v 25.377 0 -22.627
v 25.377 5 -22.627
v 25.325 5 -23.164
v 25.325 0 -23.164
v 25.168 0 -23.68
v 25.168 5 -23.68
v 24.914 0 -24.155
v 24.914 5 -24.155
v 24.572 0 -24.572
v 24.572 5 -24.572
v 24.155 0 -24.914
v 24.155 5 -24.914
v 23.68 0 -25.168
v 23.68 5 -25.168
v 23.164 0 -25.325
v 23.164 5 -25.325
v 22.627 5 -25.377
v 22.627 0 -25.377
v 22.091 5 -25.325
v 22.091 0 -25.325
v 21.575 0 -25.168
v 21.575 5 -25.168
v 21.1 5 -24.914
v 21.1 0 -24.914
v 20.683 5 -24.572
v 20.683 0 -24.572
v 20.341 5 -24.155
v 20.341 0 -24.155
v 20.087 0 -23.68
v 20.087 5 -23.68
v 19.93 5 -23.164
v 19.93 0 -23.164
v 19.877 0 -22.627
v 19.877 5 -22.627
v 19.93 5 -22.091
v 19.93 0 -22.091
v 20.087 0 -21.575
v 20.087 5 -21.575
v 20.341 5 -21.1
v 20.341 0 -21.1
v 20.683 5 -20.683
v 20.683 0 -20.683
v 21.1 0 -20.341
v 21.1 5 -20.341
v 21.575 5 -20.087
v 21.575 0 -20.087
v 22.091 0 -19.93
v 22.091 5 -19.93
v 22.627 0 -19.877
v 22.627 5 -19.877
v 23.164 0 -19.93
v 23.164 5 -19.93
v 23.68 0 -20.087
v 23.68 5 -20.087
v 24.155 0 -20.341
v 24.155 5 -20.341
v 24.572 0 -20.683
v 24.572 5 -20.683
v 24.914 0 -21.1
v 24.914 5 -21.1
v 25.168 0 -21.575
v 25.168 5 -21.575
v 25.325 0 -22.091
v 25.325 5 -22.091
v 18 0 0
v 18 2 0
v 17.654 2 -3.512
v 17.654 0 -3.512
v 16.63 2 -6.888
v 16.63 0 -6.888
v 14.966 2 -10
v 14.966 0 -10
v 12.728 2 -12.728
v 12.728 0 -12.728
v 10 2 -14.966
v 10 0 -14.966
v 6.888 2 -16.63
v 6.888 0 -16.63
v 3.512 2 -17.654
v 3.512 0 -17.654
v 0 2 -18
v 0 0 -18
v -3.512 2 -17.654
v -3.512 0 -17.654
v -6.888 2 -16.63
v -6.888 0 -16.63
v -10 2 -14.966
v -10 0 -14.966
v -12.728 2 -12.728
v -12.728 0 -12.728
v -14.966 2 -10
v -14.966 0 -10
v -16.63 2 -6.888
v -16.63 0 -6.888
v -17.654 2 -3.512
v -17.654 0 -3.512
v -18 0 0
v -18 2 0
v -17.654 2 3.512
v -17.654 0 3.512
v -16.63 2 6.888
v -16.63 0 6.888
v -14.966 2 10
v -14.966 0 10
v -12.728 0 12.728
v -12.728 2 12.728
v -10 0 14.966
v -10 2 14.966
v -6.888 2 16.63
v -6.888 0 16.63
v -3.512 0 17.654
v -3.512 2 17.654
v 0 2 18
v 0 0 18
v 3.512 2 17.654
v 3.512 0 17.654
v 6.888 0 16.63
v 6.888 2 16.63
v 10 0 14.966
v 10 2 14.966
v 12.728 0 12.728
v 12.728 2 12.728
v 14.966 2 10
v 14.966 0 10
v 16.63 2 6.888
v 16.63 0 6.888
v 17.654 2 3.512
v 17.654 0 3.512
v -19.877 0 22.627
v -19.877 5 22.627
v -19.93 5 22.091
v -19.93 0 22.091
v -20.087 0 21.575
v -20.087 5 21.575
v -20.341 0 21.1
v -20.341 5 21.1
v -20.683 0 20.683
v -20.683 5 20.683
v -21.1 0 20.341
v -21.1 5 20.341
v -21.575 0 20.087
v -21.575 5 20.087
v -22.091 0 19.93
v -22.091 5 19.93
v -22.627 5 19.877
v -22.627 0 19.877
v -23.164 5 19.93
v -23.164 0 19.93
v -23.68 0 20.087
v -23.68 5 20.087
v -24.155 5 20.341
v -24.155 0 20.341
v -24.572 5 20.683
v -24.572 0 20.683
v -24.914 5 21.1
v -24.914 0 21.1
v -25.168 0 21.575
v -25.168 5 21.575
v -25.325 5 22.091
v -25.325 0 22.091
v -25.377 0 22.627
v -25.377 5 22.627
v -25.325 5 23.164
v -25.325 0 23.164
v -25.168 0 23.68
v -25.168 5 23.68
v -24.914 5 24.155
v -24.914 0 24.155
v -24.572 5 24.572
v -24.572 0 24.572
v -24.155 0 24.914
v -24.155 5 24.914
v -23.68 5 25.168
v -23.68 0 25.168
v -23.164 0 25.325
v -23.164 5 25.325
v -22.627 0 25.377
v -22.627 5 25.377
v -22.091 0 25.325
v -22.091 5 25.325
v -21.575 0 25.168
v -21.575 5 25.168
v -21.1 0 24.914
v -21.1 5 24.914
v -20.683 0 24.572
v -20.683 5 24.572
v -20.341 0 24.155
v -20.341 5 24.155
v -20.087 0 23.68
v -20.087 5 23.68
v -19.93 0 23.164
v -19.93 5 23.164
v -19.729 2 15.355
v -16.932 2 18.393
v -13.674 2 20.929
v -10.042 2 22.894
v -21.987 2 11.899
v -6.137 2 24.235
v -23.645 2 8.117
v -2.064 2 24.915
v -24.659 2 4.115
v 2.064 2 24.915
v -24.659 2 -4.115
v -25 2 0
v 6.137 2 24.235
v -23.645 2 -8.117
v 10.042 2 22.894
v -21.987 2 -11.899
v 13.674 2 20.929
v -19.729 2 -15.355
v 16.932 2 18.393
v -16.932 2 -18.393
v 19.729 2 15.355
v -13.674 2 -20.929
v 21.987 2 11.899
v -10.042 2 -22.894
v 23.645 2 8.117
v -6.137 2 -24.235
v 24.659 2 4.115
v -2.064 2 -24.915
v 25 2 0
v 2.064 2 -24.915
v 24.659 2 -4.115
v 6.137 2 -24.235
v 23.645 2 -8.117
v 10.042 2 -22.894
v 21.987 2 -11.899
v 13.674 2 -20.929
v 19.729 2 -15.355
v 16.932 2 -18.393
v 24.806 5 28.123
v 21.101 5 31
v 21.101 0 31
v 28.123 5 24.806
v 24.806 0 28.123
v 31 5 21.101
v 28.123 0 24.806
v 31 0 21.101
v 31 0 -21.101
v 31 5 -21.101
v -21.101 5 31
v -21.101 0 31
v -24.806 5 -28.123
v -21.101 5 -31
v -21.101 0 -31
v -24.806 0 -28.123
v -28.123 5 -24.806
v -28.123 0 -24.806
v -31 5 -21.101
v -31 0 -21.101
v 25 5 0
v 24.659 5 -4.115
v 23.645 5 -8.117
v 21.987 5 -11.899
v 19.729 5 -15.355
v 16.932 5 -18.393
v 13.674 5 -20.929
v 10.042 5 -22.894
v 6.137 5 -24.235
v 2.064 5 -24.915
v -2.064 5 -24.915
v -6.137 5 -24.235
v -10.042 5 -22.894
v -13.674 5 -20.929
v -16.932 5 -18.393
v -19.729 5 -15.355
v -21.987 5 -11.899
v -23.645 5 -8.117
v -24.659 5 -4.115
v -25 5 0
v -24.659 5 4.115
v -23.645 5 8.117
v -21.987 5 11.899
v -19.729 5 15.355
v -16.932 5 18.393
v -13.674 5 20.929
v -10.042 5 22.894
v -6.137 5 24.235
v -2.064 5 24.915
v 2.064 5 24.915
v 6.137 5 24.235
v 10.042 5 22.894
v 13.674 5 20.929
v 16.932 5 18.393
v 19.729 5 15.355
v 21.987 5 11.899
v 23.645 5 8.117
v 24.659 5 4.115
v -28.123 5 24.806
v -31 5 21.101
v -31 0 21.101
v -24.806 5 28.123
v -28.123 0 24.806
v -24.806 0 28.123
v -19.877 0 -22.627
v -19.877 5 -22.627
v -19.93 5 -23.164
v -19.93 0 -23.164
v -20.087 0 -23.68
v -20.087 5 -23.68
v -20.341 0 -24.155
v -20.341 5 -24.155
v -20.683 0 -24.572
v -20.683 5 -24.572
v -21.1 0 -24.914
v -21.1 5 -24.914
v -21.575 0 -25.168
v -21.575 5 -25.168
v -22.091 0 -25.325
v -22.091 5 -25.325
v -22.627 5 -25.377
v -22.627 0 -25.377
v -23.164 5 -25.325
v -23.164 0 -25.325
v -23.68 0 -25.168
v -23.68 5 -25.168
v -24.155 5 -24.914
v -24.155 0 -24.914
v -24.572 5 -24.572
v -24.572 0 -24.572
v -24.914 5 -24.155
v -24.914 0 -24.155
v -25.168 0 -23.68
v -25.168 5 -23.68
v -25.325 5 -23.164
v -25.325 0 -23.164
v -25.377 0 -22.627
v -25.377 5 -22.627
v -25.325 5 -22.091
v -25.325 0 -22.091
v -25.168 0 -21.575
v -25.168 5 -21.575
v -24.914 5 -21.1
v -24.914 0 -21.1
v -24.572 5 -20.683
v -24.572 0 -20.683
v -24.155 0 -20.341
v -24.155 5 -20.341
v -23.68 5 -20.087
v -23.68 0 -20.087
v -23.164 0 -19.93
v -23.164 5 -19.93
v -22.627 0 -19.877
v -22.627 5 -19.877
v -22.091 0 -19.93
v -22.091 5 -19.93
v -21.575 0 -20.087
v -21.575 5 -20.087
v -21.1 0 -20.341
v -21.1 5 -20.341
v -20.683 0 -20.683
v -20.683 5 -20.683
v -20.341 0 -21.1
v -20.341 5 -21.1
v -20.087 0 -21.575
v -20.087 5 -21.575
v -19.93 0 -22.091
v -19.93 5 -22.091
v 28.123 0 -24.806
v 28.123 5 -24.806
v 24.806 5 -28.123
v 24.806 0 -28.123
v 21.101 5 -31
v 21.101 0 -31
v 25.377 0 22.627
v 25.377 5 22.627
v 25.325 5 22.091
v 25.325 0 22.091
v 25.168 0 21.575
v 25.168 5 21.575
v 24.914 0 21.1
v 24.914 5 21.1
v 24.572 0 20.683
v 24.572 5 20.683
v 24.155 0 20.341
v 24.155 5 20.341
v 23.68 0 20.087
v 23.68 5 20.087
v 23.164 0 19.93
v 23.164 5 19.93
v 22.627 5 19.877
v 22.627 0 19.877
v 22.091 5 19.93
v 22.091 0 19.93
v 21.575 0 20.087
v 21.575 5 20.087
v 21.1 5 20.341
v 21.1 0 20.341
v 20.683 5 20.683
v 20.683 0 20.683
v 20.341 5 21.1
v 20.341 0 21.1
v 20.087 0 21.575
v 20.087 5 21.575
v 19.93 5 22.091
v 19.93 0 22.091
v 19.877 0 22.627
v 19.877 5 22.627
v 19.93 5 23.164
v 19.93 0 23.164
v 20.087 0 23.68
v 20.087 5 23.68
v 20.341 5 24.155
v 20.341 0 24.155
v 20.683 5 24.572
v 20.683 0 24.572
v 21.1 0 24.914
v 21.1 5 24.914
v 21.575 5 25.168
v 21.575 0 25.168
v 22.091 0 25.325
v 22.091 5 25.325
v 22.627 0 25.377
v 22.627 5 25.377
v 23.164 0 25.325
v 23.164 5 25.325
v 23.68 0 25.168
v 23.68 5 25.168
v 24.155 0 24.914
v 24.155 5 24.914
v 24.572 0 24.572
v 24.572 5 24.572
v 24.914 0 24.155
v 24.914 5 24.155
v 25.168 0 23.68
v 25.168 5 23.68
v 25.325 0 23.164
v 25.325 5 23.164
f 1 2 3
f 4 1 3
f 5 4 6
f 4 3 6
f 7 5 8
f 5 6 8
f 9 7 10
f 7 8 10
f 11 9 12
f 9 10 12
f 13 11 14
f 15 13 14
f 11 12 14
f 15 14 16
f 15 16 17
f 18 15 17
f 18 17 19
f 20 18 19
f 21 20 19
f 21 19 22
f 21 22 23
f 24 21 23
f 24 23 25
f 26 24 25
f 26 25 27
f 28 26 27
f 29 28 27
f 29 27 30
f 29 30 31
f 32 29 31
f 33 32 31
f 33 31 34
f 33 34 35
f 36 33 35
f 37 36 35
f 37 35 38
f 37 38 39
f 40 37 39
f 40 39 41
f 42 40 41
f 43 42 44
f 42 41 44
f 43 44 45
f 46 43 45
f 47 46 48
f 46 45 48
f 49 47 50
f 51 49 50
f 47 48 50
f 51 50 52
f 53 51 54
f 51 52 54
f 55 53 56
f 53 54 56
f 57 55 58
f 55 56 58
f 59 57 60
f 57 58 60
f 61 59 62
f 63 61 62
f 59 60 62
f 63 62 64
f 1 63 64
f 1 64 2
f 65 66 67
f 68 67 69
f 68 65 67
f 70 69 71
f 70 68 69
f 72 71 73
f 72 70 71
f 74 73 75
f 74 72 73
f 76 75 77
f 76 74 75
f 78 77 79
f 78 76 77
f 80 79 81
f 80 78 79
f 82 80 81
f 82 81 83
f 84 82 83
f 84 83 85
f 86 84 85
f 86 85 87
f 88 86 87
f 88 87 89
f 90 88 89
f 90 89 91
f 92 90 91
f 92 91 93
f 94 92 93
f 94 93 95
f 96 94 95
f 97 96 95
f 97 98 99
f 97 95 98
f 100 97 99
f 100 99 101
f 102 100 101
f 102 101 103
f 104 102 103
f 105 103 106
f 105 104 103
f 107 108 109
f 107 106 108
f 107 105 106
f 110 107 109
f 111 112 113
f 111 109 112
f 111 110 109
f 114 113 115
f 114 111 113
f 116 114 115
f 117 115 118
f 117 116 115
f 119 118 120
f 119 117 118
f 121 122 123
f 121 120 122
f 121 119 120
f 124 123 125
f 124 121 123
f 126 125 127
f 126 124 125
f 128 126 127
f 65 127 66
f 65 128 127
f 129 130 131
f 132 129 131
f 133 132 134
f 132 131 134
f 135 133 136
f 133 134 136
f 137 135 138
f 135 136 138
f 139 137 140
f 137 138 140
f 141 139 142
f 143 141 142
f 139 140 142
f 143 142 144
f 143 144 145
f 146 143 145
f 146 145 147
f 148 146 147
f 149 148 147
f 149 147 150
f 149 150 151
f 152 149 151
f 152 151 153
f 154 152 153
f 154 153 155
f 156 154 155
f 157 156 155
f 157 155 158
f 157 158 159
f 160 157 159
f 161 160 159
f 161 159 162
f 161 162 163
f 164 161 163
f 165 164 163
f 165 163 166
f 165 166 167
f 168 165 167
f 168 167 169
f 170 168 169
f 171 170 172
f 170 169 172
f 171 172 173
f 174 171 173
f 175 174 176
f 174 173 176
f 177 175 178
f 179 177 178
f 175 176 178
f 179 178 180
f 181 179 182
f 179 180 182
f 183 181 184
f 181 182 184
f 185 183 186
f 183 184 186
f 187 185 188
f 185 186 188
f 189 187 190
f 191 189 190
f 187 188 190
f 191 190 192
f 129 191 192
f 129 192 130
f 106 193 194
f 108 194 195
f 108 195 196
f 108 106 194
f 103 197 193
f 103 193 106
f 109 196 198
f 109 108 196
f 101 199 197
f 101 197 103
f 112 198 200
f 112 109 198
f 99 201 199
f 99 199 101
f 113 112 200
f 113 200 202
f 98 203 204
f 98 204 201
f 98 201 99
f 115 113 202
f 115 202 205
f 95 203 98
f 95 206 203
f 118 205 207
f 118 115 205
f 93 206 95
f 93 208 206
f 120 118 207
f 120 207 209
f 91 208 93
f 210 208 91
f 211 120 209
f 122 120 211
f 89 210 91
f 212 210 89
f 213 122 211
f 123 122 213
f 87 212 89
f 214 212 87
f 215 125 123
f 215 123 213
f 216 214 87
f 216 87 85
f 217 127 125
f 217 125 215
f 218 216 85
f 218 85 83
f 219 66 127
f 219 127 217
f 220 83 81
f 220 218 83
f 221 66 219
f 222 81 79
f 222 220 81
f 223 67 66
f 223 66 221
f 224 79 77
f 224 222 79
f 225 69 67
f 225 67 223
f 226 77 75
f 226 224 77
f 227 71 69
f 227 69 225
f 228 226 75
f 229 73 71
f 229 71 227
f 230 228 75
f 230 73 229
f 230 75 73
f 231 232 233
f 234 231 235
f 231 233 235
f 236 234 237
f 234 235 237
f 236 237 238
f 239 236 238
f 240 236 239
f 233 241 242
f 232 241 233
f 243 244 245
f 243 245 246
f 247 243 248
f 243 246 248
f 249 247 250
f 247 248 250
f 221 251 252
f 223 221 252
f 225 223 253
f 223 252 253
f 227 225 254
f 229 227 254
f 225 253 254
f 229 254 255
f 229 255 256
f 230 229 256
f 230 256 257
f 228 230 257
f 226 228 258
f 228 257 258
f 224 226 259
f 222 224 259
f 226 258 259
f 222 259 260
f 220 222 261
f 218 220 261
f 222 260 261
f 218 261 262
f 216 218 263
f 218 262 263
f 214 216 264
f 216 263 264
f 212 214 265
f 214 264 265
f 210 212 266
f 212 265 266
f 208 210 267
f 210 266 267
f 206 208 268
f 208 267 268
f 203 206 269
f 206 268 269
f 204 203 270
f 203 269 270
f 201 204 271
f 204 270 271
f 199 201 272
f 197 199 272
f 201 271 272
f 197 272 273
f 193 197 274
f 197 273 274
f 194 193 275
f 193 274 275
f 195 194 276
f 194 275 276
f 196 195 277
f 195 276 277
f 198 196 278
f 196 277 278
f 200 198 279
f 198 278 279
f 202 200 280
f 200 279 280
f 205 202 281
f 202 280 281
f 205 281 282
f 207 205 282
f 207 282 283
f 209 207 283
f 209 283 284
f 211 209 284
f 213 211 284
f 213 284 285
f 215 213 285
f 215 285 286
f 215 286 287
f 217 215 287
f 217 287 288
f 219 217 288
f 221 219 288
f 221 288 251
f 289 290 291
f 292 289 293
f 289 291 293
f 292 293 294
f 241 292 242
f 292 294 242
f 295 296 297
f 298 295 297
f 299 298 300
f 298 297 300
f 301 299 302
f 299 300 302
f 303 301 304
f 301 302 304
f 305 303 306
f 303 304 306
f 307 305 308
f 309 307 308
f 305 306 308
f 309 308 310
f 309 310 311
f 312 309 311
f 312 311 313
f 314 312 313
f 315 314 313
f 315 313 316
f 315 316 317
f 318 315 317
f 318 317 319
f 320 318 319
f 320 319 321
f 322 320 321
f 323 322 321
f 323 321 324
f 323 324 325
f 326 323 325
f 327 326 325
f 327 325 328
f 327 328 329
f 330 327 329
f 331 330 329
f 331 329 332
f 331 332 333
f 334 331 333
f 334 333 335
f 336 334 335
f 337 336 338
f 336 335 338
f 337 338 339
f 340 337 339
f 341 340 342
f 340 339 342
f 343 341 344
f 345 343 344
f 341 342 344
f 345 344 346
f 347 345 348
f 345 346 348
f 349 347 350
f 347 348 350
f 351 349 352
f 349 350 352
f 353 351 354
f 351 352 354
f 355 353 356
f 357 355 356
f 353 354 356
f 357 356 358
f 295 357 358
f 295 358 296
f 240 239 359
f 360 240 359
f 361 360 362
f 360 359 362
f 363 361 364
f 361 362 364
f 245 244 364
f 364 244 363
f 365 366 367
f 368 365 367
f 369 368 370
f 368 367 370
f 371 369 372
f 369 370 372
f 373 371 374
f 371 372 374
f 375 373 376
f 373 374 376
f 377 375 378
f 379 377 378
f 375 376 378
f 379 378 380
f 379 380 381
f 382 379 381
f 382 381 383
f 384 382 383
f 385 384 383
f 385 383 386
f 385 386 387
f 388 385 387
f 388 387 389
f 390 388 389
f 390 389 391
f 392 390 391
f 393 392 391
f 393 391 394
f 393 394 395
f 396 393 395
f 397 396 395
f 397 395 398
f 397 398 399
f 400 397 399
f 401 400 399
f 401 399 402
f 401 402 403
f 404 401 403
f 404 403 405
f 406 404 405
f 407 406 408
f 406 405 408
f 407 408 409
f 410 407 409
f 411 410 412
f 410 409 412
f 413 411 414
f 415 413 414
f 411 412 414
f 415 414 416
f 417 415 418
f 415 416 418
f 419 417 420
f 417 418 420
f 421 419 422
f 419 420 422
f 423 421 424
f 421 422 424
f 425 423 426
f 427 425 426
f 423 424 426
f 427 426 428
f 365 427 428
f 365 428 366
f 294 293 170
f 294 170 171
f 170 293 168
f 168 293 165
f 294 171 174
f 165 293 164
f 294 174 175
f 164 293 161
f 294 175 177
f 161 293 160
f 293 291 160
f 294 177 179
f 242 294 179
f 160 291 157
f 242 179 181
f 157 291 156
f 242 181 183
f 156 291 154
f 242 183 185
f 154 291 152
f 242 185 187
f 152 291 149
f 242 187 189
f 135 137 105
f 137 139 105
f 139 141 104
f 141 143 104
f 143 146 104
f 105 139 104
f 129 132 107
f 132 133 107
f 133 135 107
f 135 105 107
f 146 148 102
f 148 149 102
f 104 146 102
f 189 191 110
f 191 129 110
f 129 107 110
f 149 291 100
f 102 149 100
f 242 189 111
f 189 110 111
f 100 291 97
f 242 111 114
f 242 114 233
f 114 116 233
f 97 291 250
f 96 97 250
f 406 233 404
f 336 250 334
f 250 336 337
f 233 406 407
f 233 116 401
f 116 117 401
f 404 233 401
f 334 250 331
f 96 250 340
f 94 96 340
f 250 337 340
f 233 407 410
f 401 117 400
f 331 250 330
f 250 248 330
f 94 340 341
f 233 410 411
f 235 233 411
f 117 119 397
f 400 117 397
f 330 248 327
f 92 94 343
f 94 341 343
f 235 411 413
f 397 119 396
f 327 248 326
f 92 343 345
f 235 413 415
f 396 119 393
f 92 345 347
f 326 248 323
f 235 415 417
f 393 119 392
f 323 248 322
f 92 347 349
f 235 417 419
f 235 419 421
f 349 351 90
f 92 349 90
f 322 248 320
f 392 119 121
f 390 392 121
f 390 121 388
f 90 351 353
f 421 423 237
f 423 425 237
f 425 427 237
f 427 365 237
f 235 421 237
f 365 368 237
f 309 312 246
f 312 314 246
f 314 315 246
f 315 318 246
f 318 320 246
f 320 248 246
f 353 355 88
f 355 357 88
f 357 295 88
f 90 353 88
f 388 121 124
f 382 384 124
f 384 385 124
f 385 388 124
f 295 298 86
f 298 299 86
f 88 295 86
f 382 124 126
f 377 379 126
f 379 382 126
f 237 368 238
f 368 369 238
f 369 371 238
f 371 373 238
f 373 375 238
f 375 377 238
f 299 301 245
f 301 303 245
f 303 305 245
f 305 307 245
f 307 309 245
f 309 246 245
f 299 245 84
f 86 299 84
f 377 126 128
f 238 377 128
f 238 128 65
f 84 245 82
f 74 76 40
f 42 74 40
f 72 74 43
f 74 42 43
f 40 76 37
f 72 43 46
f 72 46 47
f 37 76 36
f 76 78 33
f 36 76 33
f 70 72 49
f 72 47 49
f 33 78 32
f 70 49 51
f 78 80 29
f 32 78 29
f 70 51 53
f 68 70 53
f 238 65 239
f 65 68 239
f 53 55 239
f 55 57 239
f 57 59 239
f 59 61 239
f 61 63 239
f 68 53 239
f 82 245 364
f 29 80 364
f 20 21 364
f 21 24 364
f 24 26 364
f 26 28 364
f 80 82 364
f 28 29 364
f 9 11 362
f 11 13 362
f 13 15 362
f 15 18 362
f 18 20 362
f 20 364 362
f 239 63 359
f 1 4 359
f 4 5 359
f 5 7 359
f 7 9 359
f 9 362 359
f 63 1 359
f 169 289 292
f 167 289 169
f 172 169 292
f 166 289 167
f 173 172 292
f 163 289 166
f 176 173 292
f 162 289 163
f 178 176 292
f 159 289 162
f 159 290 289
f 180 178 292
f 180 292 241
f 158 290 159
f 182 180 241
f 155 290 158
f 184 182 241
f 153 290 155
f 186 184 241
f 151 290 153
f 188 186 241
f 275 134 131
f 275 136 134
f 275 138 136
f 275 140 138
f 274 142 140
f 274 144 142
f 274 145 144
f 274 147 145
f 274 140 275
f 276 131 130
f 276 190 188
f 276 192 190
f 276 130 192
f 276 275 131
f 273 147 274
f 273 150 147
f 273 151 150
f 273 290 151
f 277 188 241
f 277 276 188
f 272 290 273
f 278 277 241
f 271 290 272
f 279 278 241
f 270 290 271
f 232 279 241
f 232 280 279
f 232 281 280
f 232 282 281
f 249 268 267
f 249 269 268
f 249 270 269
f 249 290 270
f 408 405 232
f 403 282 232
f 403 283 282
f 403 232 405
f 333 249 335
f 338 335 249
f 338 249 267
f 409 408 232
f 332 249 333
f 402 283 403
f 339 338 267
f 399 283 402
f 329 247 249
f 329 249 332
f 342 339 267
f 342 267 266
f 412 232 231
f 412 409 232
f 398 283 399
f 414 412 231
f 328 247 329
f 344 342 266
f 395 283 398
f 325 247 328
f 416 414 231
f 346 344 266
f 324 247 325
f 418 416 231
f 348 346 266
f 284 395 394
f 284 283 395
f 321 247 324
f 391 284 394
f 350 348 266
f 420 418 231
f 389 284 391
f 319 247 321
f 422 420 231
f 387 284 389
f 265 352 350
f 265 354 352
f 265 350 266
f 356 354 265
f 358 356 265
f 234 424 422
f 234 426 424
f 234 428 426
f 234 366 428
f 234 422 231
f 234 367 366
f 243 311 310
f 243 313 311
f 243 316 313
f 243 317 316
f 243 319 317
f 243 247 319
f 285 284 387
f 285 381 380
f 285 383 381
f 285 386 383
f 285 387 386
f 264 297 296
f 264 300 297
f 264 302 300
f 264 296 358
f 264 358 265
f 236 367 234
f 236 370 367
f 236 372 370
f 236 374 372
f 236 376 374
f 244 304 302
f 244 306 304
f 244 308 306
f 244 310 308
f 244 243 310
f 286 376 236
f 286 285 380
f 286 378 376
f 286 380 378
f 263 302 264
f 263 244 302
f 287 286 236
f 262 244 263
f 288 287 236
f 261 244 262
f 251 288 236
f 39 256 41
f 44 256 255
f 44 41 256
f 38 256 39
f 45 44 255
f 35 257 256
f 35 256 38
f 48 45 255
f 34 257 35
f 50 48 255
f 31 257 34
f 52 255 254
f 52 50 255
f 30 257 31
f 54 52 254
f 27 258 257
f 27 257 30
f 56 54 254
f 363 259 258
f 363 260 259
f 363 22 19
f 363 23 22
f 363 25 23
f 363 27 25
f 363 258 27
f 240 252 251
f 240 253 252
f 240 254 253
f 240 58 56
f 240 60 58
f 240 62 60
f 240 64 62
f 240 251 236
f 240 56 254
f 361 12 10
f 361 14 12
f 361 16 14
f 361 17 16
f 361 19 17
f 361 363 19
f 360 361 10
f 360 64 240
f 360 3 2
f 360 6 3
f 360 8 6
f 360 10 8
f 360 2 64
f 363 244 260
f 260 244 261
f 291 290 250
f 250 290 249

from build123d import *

# Parameters (mm, degrees)
SKETCH1_R           = 37.5
SKETCH1_R_2         = 18
BOSS_EXTRUDE1_DEPTH = 5
SKETCH2_R           = 25
CUT_EXTRUDE1_DEPTH  = 3
SKETCH3_OUTSIDE_W   = 98.236
SKETCH3_OUTSIDE_H   = 98.236
SKETCH3_OUTSIDE_W_2 = 62
SKETCH3_OUTSIDE_H_2 = 62
CUT_EXTRUDE2_DEPTH  = 6
SKETCH4_R           = 2.75
CUT_EXTRUDE3_DEPTH  = 6


with BuildPart() as part:
    # Sketch1 → Boss-Extrude1 (new body)
    with BuildSketch(Plane(origin=(0, 0, 0), x_dir=(1, 0, 0), z_dir=(0, 1, 0))):
        Circle(SKETCH1_R)
        Circle(SKETCH1_R_2, mode=Mode.SUBTRACT)
    extrude(amount=BOSS_EXTRUDE1_DEPTH)

    # Sketch2 → Cut-Extrude1 (cut)
    with BuildSketch(Plane(origin=(0, 5, 0), x_dir=(1, 0, 0), z_dir=(0, 1, 0))):
        Circle(SKETCH2_R)
    extrude(amount=-CUT_EXTRUDE1_DEPTH, mode=Mode.SUBTRACT)

    # Sketch3 outside → Cut-Extrude2 (cut, through all)
    with BuildSketch(Plane(origin=(0, 5, 0), x_dir=(1, 0, 0), z_dir=(0, 1, 0))):
        Rectangle(SKETCH3_OUTSIDE_W, SKETCH3_OUTSIDE_H)
        Rectangle(SKETCH3_OUTSIDE_W_2, SKETCH3_OUTSIDE_H_2, mode=Mode.SUBTRACT)
    extrude(amount=-CUT_EXTRUDE2_DEPTH, mode=Mode.SUBTRACT)

    # Sketch4 → Cut-Extrude3 (cut, through all)
    with BuildSketch(Plane(origin=(0, 5, 0), x_dir=(1, 0, 0), z_dir=(0, 1, 0))):
        with Locations((-22.627416998, 22.627416998)):
            Circle(SKETCH4_R)
        with Locations((22.627416998, 22.627416998)):
            Circle(SKETCH4_R)
        with Locations((22.627416998, -22.627416998)):
            Circle(SKETCH4_R)
        with Locations((-22.627416998, -22.627416998)):
            Circle(SKETCH4_R)
    extrude(amount=-CUT_EXTRUDE3_DEPTH, mode=Mode.SUBTRACT)


solid = part.part
